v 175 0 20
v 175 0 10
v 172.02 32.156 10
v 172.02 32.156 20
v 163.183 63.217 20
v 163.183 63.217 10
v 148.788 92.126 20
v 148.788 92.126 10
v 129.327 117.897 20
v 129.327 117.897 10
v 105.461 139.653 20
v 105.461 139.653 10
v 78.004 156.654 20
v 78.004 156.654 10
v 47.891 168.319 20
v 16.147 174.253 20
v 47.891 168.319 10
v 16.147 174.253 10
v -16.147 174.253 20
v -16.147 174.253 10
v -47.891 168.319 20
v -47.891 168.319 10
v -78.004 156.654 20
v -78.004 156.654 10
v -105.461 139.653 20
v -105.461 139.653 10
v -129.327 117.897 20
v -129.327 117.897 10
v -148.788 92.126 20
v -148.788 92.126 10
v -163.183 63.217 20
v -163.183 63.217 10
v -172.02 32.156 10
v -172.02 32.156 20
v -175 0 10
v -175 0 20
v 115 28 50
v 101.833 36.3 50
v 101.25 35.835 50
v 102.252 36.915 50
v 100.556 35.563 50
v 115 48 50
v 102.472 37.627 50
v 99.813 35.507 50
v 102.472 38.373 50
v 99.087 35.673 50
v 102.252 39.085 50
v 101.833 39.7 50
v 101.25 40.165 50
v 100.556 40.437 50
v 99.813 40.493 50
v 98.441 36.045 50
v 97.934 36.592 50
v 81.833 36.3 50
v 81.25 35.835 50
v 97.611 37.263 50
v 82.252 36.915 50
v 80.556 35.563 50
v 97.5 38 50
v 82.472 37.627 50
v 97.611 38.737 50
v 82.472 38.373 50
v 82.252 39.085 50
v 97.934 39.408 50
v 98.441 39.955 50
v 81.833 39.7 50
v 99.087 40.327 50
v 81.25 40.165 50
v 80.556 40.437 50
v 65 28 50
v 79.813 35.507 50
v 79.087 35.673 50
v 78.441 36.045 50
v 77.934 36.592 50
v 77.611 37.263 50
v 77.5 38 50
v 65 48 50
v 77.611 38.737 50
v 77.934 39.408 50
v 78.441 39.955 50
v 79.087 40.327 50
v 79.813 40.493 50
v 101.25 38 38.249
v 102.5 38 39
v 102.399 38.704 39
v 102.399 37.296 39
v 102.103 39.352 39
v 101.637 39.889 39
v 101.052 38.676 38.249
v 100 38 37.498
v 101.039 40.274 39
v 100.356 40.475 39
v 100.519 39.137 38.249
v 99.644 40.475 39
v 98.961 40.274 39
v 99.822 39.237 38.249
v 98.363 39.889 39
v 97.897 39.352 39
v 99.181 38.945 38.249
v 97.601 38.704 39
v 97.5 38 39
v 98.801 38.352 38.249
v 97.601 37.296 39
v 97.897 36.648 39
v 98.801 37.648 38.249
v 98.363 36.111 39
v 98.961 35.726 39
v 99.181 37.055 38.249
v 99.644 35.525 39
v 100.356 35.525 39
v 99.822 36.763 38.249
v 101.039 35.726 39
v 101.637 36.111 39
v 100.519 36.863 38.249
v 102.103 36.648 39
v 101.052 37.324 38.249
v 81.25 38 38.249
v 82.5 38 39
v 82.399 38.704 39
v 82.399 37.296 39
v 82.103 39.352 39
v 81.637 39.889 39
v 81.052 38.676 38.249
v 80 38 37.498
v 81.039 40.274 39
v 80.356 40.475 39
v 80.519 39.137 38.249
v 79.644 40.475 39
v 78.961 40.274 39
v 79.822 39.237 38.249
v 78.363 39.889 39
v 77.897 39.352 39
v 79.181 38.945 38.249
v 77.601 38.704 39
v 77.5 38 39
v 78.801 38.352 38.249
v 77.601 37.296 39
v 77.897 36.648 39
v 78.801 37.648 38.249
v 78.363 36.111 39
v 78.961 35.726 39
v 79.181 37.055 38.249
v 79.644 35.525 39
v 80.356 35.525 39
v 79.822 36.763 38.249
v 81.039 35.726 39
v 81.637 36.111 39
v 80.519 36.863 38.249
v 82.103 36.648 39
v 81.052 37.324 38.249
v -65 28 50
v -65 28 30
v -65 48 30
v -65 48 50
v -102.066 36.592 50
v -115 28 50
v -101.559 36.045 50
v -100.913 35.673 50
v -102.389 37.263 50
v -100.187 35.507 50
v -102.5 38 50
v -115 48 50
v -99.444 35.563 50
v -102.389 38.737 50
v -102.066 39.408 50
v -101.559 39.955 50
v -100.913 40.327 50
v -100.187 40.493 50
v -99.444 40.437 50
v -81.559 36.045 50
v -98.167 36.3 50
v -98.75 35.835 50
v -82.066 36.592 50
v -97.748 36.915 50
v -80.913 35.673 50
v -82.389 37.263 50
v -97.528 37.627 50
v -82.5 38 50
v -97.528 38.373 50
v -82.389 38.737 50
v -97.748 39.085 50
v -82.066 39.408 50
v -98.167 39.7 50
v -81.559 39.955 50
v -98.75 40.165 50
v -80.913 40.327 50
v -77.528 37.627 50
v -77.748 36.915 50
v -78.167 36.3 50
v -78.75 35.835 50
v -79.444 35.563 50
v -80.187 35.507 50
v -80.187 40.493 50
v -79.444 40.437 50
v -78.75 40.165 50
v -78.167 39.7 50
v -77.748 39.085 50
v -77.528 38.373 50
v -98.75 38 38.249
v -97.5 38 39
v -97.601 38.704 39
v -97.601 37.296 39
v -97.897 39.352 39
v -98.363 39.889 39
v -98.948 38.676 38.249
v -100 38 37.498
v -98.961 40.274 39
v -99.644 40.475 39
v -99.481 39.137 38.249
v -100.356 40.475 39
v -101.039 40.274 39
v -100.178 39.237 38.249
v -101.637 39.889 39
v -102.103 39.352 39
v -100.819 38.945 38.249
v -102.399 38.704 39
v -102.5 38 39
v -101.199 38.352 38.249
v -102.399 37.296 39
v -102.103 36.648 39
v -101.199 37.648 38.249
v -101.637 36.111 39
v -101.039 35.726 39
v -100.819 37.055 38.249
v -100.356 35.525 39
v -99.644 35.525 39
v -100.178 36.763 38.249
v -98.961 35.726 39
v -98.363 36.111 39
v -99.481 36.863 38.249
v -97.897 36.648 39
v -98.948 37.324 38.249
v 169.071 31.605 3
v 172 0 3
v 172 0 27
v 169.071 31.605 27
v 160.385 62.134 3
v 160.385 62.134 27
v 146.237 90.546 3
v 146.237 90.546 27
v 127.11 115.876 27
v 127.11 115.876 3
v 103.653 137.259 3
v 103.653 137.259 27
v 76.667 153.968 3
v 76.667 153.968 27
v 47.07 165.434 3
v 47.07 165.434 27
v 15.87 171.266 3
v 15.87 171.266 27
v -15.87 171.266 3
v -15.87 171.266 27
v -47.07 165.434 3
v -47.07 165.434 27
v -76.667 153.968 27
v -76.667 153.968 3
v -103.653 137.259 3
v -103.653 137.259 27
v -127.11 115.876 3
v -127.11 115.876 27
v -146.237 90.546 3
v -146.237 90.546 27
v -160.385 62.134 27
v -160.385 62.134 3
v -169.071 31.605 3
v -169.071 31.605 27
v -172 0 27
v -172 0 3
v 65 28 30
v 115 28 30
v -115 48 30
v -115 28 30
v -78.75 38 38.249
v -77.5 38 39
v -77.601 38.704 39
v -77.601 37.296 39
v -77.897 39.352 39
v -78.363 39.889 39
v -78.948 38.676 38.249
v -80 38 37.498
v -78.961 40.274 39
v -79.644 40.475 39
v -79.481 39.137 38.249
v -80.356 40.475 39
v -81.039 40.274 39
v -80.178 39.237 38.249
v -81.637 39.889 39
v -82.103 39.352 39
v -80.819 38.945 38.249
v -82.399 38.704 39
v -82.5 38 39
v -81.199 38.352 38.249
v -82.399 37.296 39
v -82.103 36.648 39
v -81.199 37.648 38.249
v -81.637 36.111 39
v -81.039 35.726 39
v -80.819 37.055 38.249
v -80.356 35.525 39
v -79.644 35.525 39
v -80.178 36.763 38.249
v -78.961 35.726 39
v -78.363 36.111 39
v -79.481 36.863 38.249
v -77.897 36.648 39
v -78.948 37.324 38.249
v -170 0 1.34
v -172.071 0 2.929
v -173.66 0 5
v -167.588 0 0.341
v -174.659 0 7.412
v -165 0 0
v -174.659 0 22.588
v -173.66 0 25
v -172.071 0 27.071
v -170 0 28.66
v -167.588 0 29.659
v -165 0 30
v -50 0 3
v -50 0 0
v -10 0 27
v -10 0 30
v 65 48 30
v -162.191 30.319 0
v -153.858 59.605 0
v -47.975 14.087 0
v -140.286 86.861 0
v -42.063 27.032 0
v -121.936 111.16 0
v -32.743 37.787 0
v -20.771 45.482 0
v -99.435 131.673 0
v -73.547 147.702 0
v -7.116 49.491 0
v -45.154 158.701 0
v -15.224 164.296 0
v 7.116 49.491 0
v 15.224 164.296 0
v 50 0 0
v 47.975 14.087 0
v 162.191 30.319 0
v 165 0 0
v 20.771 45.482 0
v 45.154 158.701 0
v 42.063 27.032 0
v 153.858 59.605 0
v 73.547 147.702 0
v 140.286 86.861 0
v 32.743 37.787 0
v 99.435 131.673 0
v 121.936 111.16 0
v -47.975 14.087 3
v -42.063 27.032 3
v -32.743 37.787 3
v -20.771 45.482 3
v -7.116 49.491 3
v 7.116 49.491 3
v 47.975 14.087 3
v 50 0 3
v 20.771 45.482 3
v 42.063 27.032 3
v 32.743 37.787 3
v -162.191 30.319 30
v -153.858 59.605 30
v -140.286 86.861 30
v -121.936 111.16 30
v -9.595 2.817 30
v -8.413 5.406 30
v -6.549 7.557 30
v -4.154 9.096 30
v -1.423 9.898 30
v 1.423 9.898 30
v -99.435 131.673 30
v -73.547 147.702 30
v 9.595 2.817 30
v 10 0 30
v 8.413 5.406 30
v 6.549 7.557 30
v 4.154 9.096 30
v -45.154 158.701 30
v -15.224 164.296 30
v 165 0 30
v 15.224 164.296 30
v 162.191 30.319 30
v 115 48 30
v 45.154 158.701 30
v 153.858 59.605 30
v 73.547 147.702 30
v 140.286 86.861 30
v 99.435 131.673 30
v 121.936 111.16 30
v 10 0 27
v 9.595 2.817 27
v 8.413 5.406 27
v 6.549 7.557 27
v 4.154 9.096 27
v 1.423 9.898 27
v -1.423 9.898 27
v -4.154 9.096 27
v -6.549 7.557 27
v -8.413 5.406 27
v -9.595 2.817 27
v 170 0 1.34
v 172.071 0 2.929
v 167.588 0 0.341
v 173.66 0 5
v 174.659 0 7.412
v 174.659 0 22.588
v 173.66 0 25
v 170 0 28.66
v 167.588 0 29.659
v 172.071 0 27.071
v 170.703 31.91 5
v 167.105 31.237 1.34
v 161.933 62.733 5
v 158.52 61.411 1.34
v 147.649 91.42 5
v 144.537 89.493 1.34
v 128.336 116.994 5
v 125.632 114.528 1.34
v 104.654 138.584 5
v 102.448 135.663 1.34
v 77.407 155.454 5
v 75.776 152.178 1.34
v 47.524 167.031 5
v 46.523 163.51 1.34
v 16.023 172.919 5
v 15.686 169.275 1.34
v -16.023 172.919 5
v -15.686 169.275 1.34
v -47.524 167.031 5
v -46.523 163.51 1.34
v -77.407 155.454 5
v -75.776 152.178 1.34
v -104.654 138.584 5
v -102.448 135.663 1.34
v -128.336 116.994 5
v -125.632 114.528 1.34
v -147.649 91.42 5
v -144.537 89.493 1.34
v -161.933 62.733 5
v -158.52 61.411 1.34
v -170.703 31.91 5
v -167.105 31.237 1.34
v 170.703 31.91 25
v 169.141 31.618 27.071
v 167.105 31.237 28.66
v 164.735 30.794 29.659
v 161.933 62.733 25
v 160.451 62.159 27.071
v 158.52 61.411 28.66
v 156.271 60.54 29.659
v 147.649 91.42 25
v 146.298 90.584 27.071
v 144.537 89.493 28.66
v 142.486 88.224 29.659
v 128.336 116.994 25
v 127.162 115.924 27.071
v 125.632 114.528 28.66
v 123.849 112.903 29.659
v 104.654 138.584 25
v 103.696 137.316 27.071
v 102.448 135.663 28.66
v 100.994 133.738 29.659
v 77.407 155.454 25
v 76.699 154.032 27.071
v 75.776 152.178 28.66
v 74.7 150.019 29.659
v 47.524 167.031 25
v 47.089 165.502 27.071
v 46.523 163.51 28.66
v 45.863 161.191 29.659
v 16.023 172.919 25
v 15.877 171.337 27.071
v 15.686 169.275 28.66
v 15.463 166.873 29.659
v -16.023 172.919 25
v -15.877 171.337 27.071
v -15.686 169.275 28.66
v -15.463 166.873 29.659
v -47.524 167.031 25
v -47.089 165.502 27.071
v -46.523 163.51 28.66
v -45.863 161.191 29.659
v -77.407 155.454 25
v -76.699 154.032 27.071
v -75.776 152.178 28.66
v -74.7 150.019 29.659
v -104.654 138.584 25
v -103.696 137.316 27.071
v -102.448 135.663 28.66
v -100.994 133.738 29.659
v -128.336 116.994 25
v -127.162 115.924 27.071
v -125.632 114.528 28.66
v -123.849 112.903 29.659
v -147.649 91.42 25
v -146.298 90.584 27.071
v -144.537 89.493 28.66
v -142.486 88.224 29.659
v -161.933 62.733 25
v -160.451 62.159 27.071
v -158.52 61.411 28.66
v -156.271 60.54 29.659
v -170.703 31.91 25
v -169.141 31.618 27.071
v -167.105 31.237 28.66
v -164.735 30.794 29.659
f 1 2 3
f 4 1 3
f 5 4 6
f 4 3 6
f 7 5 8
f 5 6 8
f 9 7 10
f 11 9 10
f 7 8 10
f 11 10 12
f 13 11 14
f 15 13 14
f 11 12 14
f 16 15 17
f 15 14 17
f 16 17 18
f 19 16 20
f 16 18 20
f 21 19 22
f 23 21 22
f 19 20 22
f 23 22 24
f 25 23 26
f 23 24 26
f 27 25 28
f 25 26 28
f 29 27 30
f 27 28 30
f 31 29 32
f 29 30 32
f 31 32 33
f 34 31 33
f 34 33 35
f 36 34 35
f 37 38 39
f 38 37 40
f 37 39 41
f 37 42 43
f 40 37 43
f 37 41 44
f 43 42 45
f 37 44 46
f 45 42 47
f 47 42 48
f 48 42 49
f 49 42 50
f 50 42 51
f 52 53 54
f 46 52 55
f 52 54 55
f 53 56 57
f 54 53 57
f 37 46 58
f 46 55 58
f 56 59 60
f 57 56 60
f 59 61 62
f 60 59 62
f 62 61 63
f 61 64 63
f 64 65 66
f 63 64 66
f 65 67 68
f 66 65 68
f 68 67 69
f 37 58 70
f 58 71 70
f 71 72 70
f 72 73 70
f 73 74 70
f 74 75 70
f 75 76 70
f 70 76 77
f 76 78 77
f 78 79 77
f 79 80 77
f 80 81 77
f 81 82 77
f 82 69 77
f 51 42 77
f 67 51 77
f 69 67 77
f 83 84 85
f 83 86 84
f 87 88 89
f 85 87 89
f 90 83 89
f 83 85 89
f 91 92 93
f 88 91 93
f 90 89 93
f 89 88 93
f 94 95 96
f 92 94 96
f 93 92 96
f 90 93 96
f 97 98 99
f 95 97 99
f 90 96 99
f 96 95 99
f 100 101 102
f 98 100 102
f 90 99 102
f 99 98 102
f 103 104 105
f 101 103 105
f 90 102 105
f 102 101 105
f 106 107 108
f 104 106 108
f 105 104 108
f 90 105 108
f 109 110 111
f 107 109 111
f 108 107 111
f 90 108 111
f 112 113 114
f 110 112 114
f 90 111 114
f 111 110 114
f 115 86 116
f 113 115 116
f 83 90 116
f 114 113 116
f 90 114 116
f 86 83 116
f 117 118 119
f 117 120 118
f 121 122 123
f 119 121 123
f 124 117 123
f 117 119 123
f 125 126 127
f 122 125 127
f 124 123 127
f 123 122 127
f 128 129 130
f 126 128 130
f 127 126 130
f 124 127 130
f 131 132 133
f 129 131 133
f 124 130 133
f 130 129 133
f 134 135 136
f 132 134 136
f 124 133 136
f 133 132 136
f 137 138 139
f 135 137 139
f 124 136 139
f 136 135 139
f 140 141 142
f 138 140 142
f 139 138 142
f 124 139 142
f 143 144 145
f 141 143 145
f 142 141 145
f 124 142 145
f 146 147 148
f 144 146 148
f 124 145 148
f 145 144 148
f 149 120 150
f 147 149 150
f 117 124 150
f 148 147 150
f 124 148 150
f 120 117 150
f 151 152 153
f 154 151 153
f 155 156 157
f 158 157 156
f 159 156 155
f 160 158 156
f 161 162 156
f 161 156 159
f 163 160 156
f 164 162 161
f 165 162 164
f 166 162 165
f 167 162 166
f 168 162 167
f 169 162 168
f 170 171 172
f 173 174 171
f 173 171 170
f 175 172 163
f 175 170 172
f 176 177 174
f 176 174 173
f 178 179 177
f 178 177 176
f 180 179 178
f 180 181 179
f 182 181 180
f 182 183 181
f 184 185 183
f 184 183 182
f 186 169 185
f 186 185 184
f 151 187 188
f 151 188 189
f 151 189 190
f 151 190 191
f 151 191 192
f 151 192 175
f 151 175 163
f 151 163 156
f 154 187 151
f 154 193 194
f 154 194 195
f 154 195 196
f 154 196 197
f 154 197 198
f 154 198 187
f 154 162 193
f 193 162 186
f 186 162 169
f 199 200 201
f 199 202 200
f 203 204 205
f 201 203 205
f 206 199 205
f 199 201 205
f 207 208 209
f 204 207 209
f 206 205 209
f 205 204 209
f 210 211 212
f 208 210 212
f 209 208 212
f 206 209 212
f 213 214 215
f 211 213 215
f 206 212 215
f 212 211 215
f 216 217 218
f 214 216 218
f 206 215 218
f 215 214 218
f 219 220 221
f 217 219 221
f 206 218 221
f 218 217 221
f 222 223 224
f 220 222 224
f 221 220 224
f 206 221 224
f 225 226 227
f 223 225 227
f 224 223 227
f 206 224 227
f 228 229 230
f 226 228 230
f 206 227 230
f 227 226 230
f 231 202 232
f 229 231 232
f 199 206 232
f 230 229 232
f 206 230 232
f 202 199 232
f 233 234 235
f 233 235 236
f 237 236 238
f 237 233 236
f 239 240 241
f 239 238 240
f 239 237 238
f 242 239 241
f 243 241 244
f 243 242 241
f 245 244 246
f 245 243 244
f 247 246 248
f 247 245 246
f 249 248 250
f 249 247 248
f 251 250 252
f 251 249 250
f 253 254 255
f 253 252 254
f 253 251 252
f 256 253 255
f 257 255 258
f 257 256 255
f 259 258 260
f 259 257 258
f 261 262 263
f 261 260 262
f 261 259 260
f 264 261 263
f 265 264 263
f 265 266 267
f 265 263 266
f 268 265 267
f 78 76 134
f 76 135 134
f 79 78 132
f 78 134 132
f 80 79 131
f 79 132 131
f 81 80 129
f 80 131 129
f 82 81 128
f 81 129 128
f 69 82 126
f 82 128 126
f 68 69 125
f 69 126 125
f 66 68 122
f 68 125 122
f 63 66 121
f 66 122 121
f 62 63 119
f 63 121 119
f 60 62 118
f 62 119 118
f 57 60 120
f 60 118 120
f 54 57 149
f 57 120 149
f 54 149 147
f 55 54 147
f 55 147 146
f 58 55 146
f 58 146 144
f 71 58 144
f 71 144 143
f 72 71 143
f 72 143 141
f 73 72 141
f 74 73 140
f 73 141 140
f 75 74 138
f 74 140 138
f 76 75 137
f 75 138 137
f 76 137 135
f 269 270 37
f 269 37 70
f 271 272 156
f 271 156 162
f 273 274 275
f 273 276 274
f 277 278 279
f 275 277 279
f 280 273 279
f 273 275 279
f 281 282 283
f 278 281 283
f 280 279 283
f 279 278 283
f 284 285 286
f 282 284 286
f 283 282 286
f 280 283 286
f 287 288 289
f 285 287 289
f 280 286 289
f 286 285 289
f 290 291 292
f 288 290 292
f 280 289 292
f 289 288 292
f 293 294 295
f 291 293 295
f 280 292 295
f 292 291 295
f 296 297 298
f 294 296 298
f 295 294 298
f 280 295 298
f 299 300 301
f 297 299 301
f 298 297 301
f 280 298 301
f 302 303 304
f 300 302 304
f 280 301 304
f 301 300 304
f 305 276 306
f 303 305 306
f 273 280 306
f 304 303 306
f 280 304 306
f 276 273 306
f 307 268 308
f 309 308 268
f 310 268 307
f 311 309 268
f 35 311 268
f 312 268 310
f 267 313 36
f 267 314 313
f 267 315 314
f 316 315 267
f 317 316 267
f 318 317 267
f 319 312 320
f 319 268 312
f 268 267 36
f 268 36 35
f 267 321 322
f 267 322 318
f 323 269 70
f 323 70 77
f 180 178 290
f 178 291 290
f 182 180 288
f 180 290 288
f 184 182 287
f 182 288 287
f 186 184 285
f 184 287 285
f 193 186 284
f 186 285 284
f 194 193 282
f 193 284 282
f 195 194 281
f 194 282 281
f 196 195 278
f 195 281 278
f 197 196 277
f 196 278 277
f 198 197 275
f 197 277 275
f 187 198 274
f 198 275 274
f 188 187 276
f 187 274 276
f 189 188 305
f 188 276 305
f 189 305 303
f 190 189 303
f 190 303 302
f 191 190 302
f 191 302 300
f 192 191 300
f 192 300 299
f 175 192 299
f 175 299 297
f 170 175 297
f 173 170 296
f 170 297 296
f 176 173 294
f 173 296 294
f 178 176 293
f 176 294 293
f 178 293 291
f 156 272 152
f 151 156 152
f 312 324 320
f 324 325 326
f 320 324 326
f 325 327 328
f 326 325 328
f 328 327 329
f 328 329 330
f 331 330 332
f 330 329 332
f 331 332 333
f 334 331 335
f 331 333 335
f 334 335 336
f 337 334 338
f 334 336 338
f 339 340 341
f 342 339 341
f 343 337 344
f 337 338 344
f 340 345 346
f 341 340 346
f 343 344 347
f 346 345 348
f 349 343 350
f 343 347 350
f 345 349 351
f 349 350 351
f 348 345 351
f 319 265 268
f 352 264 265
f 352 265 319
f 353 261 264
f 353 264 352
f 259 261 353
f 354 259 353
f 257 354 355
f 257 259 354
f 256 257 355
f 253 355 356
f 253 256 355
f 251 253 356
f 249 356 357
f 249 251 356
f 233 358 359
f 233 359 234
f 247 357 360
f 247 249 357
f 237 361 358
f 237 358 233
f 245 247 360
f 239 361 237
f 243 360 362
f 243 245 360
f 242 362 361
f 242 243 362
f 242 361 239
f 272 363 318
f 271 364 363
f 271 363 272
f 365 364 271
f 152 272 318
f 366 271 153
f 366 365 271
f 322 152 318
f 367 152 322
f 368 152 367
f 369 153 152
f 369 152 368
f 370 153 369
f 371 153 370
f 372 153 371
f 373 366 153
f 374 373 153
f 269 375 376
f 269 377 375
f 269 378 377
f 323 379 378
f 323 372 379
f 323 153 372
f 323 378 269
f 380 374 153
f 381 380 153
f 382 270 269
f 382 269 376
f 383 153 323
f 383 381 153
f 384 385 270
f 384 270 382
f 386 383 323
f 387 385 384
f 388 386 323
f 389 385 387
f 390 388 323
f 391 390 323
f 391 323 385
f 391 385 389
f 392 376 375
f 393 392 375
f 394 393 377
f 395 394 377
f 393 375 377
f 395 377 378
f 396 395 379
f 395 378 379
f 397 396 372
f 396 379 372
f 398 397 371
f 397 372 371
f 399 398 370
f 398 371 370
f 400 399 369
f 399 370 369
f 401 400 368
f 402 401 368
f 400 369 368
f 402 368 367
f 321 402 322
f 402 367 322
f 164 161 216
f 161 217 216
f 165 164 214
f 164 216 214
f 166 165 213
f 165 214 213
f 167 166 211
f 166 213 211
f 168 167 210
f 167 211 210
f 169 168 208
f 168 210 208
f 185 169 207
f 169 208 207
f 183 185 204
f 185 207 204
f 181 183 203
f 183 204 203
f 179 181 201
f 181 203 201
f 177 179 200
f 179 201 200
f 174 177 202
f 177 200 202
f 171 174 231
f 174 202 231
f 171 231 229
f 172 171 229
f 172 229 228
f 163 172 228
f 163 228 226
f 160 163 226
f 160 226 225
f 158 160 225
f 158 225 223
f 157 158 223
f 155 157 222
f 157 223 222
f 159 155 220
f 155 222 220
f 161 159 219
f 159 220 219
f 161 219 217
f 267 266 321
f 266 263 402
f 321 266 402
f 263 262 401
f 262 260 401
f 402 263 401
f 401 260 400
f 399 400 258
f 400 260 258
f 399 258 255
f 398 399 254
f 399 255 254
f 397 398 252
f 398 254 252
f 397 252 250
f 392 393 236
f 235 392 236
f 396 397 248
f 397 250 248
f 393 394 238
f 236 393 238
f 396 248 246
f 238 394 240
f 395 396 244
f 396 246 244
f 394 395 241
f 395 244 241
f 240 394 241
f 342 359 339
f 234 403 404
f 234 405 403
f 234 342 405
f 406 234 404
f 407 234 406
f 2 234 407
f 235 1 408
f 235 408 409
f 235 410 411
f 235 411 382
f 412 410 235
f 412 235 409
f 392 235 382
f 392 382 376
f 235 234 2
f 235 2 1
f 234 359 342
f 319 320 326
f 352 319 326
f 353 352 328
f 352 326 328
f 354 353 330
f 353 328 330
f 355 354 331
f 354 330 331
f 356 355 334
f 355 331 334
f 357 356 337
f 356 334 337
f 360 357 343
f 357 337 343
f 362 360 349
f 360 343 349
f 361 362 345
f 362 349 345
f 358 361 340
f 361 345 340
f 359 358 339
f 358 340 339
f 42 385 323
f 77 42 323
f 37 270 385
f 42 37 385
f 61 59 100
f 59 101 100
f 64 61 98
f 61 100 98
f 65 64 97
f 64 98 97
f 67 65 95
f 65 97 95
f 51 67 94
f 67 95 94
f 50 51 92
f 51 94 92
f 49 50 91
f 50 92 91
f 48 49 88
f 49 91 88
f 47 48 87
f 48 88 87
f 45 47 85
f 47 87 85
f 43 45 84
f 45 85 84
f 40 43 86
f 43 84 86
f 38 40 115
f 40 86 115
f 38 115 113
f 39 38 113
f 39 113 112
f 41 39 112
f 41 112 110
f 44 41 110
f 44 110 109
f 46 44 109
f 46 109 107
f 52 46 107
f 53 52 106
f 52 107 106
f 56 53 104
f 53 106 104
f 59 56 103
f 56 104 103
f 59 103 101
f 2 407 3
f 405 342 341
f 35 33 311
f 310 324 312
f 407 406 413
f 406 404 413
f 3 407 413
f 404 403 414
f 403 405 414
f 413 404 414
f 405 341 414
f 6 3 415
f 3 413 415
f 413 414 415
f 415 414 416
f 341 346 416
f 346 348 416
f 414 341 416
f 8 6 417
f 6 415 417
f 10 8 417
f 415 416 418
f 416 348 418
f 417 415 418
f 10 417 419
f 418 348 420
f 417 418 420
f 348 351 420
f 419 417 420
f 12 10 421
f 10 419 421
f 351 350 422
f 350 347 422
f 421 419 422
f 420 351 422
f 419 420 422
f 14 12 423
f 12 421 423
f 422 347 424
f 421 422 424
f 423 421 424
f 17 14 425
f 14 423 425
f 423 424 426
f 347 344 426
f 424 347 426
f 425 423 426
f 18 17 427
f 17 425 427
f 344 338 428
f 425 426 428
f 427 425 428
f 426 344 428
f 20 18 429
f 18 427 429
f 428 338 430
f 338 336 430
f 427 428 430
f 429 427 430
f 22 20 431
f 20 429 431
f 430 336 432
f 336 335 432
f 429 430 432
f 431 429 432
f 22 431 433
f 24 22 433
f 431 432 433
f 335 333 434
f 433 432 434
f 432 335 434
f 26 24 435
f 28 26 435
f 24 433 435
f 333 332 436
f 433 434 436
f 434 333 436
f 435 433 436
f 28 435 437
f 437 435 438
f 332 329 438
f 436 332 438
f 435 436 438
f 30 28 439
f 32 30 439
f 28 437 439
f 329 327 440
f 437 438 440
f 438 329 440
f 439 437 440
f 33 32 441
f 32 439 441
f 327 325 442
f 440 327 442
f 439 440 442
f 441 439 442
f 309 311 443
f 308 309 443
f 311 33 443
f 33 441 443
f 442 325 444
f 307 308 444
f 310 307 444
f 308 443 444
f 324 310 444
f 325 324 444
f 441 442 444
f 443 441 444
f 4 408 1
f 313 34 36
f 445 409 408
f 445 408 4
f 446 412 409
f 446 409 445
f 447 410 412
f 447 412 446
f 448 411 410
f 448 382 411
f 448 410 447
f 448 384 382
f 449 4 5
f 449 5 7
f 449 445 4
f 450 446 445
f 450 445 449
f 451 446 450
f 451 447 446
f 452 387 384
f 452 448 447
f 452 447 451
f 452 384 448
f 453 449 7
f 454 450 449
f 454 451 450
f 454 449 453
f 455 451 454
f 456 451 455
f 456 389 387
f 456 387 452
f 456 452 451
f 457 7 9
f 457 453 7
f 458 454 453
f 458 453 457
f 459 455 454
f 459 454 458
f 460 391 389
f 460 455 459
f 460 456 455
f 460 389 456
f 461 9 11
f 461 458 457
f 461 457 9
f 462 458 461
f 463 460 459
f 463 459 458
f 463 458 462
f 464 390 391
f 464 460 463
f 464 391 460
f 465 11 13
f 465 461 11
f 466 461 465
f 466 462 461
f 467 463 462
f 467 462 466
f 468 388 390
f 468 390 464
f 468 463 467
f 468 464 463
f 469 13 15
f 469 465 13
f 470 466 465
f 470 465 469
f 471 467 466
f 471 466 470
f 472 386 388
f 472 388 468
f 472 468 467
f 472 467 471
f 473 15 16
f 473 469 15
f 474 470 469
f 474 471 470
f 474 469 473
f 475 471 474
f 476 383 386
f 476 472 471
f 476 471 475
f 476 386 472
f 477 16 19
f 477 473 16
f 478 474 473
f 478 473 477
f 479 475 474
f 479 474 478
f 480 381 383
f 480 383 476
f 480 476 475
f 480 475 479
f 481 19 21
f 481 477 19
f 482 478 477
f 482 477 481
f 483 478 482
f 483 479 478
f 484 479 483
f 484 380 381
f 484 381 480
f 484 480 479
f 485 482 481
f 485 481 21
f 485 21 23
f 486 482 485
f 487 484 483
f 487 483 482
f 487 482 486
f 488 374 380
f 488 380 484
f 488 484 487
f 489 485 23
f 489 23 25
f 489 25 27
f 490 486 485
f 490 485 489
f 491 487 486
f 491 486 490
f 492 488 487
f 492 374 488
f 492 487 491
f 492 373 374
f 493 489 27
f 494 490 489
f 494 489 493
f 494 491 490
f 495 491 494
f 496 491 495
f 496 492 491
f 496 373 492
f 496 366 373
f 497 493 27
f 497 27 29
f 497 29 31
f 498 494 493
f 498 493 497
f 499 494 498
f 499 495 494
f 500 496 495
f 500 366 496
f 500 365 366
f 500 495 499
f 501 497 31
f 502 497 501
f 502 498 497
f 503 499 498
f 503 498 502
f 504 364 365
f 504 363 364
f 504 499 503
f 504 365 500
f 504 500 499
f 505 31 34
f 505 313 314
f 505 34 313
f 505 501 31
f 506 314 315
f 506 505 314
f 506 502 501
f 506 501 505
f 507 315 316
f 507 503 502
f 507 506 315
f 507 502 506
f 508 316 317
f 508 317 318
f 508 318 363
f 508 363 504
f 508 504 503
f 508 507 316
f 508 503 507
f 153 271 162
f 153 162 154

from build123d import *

# Parameters (mm, degrees)
SKETCH1_R                    = 175
BOSS_EXTRUDE3_DEPTH          = 30
CUT_EXTRUDE1_DEPTH           = 50
SHELL2_T                     = -3
SKETCH4_R                    = 10
CUT_EXTRUDE2_DEPTH           = 50
FILLET1_R                    = 10
SKETCH6_R                    = 50
CUT_EXTRUDE4_DEPTH           = 10
SKETCH9_W                    = 50
SKETCH9_H                    = 20
BOSS_EXTRUDE4_DEPTH          = 20
F_5_0_5_DIAMETER_HOLE2_D     = 5
F_5_0_5_DIAMETER_HOLE2_DEPTH = 11
F_5_0_5_DIAMETER_HOLE2_TIP   = 1.502151548


with BuildPart() as part:
    # Sketch1 → Boss-Extrude3 (new body)
    with BuildSketch(Plane.XY):
        Circle(SKETCH1_R)
    extrude(amount=BOSS_EXTRUDE3_DEPTH)

    # Sketch3 → Cut-Extrude1 (cut)
    with BuildSketch(Plane.XY.offset(30)):
        with BuildLine():
            Line((-175, 0), (175, 0))
            ThreePointArc((175, 0), (0, -175), (-175, 0))
        make_face()
    extrude(amount=-CUT_EXTRUDE1_DEPTH, mode=Mode.SUBTRACT)

    # Shell2
    shell2_openings = [part.faces().sort_by_distance(p)[0] for p in [
        (0, 0, 15),
    ]]
    offset(amount=SHELL2_T, openings=shell2_openings)

    # Sketch4 → Cut-Extrude2 (cut)
    with BuildSketch(Plane.XY.offset(30)):
        Circle(SKETCH4_R)
    extrude(amount=-CUT_EXTRUDE2_DEPTH, mode=Mode.SUBTRACT)

    # Fillet1
    fillet1_edges = [part.edges().sort_by_distance(p)[0] for p in [
        (0, 175, 0),
        (0, 175, 30),
    ]]
    fillet(fillet1_edges, radius=FILLET1_R)

    # Sketch6 → Cut-Extrude4 (cut)
    with BuildSketch(Plane(origin=(0, 0, 0), x_dir=(-1, 0, 0), z_dir=(0, 0, -1))):
        Circle(SKETCH6_R)
    extrude(amount=-CUT_EXTRUDE4_DEPTH, mode=Mode.SUBTRACT)

    # Sketch9 → Boss-Extrude4 (add)
    with BuildSketch(Plane.XY.offset(30)):
        with Locations((-90, 38)):
            Rectangle(SKETCH9_W, SKETCH9_H)
    boss_extrude4 = extrude(amount=BOSS_EXTRUDE4_DEPTH)

    # Mirror2: Boss-Extrude4 across plane
    add(boss_extrude4.mirror(Plane(origin=(0, 0, 0), x_dir=(0, 0, 1), z_dir=(1, 0, 0))))

    # Ø5.0 (5) Diameter Hole2
    with Locations(Plane.XY.offset(50)):
        with Locations((-100, 38), (-80, 38), (80, 38), (100, 38)):
            Hole(F_5_0_5_DIAMETER_HOLE2_D / 2, depth=F_5_0_5_DIAMETER_HOLE2_DEPTH)
            with Locations((0, 0, -(F_5_0_5_DIAMETER_HOLE2_DEPTH + F_5_0_5_DIAMETER_HOLE2_TIP / 2))):  # 118° drill point
                Cone(0, F_5_0_5_DIAMETER_HOLE2_D / 2, F_5_0_5_DIAMETER_HOLE2_TIP, mode=Mode.SUBTRACT)


solid = part.part
